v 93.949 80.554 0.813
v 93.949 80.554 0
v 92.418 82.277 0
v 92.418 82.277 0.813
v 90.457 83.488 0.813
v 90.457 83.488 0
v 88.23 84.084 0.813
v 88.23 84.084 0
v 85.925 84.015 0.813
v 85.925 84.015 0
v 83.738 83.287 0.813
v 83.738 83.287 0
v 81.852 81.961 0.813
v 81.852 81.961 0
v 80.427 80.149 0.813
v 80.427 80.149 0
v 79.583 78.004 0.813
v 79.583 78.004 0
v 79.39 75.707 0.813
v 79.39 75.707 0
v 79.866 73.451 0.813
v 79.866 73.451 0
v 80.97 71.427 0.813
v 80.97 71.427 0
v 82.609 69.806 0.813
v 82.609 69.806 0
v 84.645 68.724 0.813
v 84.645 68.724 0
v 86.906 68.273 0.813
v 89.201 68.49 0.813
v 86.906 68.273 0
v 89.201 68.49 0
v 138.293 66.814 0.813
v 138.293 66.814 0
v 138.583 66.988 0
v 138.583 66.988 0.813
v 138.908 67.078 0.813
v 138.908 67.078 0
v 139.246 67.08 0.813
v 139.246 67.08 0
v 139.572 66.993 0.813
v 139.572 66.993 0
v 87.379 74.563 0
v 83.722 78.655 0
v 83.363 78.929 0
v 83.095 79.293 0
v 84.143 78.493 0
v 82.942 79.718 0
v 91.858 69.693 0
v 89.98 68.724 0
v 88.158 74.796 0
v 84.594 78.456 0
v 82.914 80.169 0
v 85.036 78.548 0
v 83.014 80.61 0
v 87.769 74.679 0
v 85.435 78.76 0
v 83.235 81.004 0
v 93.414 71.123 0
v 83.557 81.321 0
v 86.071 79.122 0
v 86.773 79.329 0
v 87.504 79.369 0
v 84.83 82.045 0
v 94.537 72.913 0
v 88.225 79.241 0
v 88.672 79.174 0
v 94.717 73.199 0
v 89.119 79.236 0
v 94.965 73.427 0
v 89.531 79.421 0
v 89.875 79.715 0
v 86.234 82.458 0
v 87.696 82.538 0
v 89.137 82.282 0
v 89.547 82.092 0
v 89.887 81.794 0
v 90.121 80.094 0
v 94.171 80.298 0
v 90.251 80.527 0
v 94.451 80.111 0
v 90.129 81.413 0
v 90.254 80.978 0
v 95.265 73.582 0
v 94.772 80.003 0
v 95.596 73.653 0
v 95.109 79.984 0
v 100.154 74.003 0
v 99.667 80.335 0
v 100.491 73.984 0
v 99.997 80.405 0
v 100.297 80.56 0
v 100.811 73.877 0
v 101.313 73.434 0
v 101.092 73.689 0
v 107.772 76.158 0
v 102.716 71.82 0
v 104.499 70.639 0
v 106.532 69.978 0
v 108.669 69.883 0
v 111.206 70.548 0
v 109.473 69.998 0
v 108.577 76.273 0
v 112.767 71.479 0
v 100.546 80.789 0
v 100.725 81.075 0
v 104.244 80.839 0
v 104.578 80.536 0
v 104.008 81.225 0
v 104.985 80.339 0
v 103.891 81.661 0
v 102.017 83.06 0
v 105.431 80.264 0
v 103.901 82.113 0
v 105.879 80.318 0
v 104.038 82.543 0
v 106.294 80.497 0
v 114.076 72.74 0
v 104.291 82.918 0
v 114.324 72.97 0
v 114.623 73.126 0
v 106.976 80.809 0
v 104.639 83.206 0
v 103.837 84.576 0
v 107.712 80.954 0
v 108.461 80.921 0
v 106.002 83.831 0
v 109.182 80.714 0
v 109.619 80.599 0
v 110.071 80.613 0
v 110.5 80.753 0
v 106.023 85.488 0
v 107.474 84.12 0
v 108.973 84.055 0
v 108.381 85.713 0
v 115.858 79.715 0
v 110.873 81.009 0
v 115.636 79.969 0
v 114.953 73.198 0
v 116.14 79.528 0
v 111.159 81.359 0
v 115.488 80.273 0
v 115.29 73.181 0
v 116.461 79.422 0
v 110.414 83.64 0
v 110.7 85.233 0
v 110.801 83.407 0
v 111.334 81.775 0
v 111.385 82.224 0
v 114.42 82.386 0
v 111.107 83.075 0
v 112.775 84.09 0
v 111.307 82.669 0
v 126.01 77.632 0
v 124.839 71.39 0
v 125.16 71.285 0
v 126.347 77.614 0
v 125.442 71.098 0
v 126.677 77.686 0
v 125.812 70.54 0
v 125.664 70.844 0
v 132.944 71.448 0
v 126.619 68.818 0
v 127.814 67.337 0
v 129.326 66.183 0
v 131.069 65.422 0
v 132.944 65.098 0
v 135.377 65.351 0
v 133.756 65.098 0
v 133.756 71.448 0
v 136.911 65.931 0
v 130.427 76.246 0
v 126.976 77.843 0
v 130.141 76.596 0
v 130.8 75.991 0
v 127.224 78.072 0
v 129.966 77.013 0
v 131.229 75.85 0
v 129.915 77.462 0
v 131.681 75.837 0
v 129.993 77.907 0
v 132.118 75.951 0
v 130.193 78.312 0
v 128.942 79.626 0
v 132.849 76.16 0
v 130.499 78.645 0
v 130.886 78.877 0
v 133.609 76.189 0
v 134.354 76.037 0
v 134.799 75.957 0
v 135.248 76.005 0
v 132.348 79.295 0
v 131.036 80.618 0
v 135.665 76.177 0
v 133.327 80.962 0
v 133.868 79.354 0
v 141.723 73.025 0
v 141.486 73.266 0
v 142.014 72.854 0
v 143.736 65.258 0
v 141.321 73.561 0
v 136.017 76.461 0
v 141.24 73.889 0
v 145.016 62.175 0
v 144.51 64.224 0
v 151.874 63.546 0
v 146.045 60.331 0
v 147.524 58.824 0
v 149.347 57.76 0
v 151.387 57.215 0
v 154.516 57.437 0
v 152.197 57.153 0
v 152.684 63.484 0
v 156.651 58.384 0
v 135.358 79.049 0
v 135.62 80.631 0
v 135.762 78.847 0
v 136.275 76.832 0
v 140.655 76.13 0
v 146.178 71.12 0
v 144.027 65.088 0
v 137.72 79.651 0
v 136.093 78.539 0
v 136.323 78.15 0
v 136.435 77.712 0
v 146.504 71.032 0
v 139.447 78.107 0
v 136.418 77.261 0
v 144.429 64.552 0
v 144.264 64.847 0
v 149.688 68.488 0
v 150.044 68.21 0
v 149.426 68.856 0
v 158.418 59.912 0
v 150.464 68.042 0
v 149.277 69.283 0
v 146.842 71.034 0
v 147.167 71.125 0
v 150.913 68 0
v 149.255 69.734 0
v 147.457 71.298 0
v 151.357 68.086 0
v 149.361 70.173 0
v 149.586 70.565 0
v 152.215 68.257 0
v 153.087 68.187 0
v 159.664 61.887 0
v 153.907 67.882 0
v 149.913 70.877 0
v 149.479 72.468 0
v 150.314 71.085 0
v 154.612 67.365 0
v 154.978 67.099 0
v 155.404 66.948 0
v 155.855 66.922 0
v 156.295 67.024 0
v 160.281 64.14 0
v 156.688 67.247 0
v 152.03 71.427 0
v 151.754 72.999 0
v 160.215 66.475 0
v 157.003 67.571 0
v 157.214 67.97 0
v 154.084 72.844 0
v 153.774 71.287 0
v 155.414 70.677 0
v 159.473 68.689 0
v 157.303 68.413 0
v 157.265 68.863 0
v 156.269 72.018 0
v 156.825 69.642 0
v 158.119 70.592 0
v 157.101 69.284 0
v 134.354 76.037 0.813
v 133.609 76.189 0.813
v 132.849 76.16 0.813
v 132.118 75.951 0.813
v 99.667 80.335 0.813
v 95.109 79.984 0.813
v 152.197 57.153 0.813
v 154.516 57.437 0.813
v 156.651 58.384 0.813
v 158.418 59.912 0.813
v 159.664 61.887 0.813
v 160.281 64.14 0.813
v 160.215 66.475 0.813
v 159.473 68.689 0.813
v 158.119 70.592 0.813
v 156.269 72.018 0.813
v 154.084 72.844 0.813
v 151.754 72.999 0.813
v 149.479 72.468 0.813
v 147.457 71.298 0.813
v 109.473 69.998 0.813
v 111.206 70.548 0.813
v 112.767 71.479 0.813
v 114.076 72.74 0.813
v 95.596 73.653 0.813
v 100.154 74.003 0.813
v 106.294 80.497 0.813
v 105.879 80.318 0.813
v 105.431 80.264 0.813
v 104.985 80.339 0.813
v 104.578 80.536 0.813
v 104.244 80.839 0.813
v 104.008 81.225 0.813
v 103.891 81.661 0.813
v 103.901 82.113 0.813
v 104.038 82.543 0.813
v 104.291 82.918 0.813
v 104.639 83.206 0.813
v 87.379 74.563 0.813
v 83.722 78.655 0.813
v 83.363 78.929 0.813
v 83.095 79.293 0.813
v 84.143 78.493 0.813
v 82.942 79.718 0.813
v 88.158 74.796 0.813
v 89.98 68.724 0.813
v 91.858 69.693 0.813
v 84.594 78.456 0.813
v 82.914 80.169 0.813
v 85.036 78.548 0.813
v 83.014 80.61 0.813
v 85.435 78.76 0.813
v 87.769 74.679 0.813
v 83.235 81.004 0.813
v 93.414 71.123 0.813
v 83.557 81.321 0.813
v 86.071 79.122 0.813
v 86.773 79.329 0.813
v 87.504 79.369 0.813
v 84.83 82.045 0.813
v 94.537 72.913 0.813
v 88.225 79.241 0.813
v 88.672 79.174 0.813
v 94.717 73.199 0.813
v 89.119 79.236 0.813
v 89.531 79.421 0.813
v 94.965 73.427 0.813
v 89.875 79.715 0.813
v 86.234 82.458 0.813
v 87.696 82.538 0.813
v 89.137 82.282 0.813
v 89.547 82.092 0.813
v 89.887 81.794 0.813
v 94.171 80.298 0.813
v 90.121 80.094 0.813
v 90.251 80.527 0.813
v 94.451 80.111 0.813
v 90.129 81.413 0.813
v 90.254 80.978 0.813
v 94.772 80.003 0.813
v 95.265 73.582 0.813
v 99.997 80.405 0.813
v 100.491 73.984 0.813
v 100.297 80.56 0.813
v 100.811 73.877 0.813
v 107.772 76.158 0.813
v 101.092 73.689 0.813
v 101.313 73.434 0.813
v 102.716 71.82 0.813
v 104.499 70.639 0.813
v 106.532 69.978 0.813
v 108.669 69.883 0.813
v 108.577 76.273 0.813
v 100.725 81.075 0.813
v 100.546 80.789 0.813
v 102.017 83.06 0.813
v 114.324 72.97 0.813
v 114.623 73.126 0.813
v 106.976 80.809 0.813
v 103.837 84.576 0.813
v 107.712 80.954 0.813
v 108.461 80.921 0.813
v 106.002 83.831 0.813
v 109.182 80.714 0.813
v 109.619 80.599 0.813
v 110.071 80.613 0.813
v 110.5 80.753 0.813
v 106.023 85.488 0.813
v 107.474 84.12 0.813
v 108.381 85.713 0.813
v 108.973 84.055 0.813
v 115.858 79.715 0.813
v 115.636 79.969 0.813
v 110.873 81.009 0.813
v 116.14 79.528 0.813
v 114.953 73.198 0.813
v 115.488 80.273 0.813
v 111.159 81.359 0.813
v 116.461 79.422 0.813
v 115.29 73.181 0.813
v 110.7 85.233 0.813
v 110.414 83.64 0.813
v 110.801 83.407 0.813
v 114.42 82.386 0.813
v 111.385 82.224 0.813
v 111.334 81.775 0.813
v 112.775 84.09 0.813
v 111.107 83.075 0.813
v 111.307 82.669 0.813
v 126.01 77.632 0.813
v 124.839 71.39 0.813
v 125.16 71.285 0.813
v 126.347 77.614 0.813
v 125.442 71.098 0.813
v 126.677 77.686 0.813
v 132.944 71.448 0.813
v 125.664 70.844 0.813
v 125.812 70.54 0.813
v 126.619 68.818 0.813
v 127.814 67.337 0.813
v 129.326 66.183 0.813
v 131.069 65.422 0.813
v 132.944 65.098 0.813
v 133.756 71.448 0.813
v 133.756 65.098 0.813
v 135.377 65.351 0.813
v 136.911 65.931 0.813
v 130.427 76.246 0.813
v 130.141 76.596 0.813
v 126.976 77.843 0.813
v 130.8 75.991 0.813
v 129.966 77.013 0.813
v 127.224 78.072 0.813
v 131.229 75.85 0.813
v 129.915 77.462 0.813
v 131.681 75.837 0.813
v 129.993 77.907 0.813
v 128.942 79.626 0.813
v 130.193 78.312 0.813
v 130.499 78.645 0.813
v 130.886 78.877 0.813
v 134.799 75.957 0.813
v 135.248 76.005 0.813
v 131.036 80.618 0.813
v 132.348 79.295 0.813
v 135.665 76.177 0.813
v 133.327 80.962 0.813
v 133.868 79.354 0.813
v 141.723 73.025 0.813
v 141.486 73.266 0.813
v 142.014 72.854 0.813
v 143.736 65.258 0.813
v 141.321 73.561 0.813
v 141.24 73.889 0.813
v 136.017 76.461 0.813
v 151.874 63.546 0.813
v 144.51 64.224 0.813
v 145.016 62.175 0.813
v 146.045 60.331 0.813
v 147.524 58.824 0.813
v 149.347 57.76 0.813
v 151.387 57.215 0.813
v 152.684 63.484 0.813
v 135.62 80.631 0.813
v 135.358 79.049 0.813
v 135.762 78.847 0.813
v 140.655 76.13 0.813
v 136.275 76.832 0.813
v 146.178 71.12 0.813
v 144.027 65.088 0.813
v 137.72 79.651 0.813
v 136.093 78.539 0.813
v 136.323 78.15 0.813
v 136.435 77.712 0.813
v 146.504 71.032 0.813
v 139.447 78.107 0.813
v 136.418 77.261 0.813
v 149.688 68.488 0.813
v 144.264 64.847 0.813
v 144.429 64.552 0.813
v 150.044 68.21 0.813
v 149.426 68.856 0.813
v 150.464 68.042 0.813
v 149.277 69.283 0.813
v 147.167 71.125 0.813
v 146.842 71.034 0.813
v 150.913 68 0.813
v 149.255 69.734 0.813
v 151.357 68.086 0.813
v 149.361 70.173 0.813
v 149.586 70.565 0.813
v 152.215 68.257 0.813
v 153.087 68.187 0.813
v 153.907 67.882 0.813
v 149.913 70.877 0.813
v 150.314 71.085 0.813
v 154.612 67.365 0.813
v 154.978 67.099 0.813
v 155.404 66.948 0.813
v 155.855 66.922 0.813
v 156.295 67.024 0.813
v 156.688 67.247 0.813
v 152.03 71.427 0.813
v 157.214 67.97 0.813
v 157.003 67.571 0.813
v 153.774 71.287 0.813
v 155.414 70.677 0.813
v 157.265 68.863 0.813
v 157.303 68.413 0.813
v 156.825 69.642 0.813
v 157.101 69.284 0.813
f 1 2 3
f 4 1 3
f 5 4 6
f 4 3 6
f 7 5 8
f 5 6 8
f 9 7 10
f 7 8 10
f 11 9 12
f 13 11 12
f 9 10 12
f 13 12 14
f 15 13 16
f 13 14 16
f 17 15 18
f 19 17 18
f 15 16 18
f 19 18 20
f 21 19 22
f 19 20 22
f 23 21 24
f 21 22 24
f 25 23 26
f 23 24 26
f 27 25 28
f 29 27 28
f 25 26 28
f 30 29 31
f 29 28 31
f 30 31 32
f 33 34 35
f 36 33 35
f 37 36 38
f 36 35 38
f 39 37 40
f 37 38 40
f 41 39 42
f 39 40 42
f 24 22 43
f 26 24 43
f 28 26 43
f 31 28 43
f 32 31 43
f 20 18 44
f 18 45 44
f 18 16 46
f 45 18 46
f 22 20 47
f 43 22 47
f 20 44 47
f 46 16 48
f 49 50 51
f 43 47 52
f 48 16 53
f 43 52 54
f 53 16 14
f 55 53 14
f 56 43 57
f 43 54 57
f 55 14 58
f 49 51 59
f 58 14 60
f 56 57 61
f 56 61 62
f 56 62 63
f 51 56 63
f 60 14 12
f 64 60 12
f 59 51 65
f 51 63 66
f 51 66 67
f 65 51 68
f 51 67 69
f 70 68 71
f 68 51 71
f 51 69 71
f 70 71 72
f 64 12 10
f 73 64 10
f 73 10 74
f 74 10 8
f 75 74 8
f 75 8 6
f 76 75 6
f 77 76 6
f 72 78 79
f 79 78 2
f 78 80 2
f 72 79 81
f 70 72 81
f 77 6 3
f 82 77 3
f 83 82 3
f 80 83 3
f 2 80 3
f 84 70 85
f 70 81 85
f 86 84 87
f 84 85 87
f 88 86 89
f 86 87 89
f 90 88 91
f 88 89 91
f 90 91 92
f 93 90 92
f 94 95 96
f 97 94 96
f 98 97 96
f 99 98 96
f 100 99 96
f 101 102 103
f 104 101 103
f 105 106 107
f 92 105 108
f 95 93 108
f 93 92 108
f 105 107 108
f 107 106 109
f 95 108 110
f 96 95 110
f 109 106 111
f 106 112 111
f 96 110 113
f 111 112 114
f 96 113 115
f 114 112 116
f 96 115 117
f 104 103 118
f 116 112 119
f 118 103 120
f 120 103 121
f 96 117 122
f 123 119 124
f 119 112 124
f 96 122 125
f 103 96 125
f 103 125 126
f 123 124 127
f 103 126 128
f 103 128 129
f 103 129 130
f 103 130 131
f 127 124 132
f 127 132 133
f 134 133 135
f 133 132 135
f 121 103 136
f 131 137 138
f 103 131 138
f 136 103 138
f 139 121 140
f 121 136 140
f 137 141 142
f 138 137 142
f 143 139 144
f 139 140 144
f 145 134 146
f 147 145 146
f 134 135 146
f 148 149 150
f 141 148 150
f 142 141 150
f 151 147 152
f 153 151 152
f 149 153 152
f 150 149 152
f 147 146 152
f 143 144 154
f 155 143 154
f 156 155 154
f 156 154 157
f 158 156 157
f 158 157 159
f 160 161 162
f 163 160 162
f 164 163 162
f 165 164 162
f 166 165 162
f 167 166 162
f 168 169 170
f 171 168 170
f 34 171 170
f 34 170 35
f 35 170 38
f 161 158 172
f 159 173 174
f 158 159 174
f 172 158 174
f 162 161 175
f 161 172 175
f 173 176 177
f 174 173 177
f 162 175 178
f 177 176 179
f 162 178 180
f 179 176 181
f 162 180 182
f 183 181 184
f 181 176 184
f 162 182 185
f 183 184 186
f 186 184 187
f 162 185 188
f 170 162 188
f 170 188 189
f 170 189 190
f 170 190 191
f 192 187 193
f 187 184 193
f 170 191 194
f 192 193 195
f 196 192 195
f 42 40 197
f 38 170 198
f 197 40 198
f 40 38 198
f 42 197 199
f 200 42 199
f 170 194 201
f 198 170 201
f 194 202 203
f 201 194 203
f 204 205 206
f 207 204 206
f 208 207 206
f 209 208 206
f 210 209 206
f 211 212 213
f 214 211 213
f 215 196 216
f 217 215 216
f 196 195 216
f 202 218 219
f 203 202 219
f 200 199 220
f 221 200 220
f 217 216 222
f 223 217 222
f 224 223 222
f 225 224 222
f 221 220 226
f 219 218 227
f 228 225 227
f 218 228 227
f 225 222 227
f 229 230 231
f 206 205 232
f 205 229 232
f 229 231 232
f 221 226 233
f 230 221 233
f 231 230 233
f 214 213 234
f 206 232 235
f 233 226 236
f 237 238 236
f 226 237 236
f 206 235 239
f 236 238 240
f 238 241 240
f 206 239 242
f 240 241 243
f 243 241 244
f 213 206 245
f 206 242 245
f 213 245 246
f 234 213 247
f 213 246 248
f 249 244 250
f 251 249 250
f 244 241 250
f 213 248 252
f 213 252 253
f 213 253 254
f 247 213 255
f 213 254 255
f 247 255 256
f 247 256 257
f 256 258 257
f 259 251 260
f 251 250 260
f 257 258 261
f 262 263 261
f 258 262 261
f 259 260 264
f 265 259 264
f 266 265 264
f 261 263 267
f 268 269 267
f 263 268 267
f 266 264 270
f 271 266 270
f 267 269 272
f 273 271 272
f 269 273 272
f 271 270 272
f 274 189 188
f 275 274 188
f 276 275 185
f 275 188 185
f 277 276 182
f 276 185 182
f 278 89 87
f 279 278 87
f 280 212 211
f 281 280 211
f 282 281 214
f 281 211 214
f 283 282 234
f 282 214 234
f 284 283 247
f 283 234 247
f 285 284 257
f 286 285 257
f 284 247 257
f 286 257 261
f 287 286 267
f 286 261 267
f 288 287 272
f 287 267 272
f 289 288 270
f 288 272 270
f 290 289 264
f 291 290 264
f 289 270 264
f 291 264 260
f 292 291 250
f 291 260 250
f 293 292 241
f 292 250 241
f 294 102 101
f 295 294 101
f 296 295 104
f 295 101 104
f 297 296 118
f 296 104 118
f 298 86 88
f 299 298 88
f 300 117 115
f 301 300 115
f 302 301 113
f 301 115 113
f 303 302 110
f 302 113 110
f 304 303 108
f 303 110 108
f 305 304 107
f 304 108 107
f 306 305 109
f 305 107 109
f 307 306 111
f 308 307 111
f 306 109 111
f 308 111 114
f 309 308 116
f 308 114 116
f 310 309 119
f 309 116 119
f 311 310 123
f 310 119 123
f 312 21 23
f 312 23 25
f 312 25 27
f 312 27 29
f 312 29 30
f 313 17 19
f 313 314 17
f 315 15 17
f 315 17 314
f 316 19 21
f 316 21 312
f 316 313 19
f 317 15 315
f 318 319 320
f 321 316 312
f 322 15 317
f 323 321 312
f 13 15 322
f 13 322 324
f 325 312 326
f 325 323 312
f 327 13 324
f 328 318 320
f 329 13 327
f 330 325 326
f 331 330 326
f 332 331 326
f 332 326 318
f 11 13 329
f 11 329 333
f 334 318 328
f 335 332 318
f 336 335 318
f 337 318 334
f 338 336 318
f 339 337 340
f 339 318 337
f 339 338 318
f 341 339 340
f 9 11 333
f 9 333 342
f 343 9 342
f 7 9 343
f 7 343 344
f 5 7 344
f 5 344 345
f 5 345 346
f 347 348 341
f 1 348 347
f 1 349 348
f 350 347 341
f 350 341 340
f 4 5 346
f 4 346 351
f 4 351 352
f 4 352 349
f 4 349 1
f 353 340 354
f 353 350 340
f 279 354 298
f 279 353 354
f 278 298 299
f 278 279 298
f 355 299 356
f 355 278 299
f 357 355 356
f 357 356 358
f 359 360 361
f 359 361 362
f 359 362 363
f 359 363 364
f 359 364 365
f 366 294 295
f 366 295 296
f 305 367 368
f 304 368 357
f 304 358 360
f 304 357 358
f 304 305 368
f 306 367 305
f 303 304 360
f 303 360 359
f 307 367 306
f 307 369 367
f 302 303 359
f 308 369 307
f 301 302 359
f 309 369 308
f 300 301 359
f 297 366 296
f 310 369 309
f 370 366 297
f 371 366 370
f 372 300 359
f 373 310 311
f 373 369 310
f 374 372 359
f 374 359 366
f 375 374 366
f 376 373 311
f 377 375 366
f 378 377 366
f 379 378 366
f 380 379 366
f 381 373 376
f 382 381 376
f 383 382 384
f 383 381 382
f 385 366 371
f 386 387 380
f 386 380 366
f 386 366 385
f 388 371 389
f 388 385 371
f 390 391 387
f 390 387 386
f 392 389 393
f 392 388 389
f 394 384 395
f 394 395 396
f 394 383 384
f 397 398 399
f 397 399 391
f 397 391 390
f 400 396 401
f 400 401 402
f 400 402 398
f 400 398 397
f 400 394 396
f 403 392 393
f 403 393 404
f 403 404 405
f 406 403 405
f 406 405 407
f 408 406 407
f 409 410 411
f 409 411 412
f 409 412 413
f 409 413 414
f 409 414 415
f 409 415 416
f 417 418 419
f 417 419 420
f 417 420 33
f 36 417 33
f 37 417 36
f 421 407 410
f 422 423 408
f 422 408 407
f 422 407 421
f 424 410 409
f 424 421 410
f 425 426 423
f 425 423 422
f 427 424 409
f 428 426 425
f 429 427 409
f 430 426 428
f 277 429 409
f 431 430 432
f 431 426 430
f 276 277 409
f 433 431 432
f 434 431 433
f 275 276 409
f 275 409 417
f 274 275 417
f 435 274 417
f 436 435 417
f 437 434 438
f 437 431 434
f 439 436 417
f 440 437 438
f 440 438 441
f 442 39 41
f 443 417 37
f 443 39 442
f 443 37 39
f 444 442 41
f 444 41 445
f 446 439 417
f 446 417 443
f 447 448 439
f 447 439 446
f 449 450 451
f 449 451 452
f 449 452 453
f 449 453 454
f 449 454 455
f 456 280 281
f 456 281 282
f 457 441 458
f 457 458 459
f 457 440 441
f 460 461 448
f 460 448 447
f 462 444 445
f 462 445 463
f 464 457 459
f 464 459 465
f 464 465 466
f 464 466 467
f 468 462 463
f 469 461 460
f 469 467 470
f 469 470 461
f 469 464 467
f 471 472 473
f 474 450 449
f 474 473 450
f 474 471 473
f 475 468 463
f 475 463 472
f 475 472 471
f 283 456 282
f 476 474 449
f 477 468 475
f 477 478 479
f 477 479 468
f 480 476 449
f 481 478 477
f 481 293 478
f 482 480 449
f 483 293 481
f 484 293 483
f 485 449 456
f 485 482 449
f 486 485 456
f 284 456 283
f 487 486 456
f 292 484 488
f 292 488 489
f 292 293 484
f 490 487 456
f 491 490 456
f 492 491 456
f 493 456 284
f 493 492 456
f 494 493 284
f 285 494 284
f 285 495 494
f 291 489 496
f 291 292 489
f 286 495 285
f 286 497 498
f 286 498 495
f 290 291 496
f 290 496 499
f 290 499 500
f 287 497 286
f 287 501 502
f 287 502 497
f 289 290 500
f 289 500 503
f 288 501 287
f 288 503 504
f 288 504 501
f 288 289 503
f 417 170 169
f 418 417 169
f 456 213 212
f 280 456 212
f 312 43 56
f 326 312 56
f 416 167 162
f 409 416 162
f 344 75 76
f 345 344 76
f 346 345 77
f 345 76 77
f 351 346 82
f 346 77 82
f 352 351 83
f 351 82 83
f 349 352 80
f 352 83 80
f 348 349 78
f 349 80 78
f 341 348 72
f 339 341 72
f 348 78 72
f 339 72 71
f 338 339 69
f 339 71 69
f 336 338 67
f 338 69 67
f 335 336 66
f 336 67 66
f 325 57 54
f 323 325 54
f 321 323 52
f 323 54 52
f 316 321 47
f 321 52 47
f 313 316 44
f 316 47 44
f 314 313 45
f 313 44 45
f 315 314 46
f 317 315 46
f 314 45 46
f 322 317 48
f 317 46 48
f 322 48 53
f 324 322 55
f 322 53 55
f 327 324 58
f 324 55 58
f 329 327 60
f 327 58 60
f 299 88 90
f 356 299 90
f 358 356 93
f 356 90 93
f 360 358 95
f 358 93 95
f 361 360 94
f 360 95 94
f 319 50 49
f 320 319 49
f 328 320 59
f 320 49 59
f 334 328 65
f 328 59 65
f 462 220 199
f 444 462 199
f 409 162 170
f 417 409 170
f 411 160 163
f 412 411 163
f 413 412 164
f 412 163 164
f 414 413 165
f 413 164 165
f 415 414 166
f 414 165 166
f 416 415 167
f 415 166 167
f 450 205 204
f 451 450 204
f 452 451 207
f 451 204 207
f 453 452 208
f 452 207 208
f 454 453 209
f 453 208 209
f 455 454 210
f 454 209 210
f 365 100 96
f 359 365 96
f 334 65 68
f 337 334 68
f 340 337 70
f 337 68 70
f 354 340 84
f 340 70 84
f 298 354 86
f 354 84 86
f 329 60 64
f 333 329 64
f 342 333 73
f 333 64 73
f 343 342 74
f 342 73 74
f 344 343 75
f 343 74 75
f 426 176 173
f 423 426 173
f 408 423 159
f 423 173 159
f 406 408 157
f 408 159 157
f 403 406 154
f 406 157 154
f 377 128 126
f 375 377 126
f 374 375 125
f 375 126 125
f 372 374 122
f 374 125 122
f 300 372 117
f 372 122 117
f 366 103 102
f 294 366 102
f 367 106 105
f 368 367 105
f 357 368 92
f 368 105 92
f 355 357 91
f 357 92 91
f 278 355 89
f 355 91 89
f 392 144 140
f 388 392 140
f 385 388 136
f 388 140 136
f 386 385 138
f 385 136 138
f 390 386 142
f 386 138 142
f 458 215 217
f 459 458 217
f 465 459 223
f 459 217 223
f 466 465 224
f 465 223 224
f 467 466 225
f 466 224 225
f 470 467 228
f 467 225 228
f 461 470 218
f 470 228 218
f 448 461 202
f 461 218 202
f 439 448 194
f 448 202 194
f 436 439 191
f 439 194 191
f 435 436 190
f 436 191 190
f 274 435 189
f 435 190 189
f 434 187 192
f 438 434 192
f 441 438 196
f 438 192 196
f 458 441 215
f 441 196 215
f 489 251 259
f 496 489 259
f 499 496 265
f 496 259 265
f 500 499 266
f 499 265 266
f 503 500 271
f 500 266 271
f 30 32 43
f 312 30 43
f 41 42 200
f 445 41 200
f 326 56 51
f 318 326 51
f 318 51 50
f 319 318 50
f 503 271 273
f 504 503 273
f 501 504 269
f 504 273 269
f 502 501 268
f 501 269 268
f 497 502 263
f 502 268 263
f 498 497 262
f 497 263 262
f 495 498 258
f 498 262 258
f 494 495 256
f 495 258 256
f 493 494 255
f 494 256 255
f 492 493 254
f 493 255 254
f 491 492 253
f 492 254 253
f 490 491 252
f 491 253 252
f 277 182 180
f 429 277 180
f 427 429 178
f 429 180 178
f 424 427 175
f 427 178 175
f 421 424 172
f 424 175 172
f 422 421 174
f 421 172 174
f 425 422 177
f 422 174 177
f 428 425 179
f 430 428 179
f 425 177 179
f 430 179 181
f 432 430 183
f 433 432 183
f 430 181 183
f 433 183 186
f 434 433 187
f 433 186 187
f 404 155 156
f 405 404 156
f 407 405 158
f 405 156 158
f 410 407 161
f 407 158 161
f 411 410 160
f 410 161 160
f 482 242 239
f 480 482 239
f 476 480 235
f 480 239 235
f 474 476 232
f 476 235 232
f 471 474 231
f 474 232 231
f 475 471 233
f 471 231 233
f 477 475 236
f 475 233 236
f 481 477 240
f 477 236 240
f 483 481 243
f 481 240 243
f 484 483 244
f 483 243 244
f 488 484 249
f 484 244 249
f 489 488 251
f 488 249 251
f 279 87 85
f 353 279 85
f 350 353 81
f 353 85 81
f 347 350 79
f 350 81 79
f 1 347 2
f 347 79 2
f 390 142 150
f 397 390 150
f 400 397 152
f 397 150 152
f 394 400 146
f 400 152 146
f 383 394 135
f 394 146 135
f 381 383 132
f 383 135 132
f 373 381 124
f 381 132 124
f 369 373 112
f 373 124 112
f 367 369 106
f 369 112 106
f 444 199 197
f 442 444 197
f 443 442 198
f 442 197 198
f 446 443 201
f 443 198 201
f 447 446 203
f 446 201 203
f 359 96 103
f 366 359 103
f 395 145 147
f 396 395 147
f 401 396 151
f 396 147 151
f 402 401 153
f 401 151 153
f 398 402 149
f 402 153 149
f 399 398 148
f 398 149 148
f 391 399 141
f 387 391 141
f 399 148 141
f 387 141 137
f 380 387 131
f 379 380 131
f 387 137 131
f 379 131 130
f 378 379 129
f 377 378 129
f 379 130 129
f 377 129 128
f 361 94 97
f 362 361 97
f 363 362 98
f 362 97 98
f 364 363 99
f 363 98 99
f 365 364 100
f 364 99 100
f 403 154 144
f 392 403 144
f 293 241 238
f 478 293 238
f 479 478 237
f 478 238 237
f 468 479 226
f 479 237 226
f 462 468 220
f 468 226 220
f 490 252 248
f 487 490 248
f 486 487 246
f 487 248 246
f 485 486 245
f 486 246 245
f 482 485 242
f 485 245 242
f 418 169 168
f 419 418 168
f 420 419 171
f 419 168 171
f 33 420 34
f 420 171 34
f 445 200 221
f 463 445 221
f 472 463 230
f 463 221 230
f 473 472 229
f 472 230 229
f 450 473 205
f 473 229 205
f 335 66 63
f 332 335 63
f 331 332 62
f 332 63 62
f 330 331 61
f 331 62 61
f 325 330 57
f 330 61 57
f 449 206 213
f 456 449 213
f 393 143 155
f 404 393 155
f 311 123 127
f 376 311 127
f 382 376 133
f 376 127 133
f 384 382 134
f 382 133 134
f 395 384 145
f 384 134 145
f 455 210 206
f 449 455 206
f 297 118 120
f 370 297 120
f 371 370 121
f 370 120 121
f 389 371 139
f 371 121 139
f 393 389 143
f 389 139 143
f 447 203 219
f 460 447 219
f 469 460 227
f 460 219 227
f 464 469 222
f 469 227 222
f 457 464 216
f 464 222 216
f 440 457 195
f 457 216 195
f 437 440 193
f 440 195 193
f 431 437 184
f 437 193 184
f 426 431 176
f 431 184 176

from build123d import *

# Parameters (mm, degrees)
BOSS_EXTRUDE1_DEPTH = 0.8128


with BuildPart() as part:
    # Sketch4 → Boss-Extrude1 (new body)
    with BuildSketch(Plane.XY):
        with BuildLine():
            ThreePointArc((93.949424924, 80.553749396), (79.926578404, 79.107244128), (89.201071756, 68.490447291))
            Line((89.201071756, 68.490447291), (87.379404166, 74.562672592))
            Line((87.379404166, 74.562672592), (87.768664768, 74.679450772))
            Line((87.768664768, 74.679450772), (88.157925371, 74.796228953))
            Line((88.157925371, 74.796228953), (89.979592961, 68.724003652))
            ThreePointArc((89.979592961, 68.724003652), (92.683522719, 70.35568471), (94.537210983, 72.912530234))
            ThreePointArc((94.537210983, 72.912530234), (94.965343033, 73.427292247), (95.595760228, 73.652794227))
            Line((95.595760228, 73.652794227), (100.153762821, 74.003409811))
            ThreePointArc((100.153762821, 74.003409811), (100.811251698, 73.876977473), (101.313075076, 73.433750604))
            ThreePointArc((101.313075076, 73.433750604), (104.499077144, 70.639420699), (108.66874425, 69.88260829))
            Line((108.66874425, 69.88260829), (107.772190929, 76.15848154))
            Line((107.772190929, 76.15848154), (108.174506403, 76.215955179))
            Line((108.174506403, 76.215955179), (108.576821877, 76.273428818))
            Line((108.576821877, 76.273428818), (109.473375199, 69.997555568))
            ThreePointArc((109.473375199, 69.997555568), (112.013123253, 70.968780496), (114.076058013, 72.740191859))
            ThreePointArc((114.076058013, 72.740191859), (114.622955908, 73.126429859), (115.290273938, 73.180870175))
            Line((115.290273938, 73.180870175), (124.839494012, 71.390391411))
            ThreePointArc((124.839494012, 71.390391411), (125.441762928, 71.097903494), (125.811592802, 70.539779051))
            ThreePointArc((125.811592802, 70.539779051), (128.535078066, 66.714656664), (132.9436, 65.097910667))
            Line((132.9436, 65.097910667), (132.9436, 71.447910667))
            Line((132.9436, 71.447910667), (133.35, 71.447910667))
            Line((133.35, 71.447910667), (133.7564, 71.447910667))
            Line((133.7564, 71.447910667), (133.7564, 65.097910667))
            ThreePointArc((133.7564, 65.097910667), (136.15889652, 65.601119169), (138.292771811, 66.814290453))
            ThreePointArc((138.292771811, 66.814290453), (138.908022168, 67.078379412), (139.572075423, 66.99288524))
            Line((139.572075423, 66.99288524), (143.735615445, 65.258076898))
            ThreePointArc((143.735615445, 65.258076898), (144.263910207, 64.846759758), (144.509615464, 64.223938699))
            ThreePointArc((144.509615464, 64.223938699), (146.734319899, 59.528365603), (151.386817059, 57.214929481))
            Line((151.386817059, 57.214929481), (151.873839827, 63.546225464))
            Line((151.873839827, 63.546225464), (152.27904277, 63.515056007))
            Line((152.27904277, 63.515056007), (152.684245713, 63.48388655))
            Line((152.684245713, 63.48388655), (152.197222945, 57.152590567))
            ThreePointArc((152.197222945, 57.152590567), (159.92620767, 67.609424733), (147.457228033, 71.298209423))
            ThreePointArc((147.457228033, 71.298209423), (146.84197711, 71.034120487), (146.177923414, 71.119615244))
            Line((146.177923414, 71.119615244), (142.014384371, 72.854423179))
            ThreePointArc((142.014384371, 72.854423179), (141.486089803, 73.265740229), (141.240384561, 73.888561071))
            ThreePointArc((141.240384561, 73.888561071), (135.620274674, 80.630902915), (127.223942036, 78.0723082))
            ThreePointArc((127.223942036, 78.0723082), (126.677044199, 77.68607018), (126.009726211, 77.631629797))
            Line((126.009726211, 77.631629797), (116.460505988, 79.422108589))
            ThreePointArc((116.460505988, 79.422108589), (115.858237072, 79.714596506), (115.488407198, 80.272720949))
            ThreePointArc((115.488407198, 80.272720949), (108.380699585, 85.713306212), (100.725289029, 81.074969792))
            ThreePointArc((100.725289029, 81.074969792), (100.297156978, 80.560207761), (99.666739772, 80.334705773))
            Line((99.666739772, 80.334705773), (95.108737382, 79.984090204))
            ThreePointArc((95.108737382, 79.984090204), (94.451248393, 80.110522482), (93.949424924, 80.553749396))
        make_face()
        with BuildLine():
            ThreePointArc((156.824589095, 69.642224068), (156.857122838, 67.397395778), (154.612294548, 67.364862034))
            ThreePointArc((154.612294548, 67.364862034), (153.086943568, 68.187295725), (151.356947016, 68.08627733))
            ThreePointArc((151.356947016, 68.08627733), (149.336031859, 69.064139502), (150.313894032, 71.085054659))
            ThreePointArc((150.313894032, 71.085054659), (153.773887136, 71.287091449), (156.824589095, 69.642224068))
        make_face(mode=Mode.SUBTRACT)
        with BuildLine():
            ThreePointArc((88.224829537, 79.241098456), (86.773324607, 79.32888397), (85.434920368, 78.760335862))
            ThreePointArc((85.434920368, 78.760335862), (83.215962621, 79.101713977), (83.557340736, 81.320671724))
            ThreePointArc((83.557340736, 81.320671724), (86.234149214, 82.457767939), (89.137159073, 82.282196911))
            ThreePointArc((89.137159073, 82.282196911), (90.201543533, 80.305482915), (88.224829537, 79.241098456))
        make_face(mode=Mode.SUBTRACT)
        with BuildLine():
            ThreePointArc((106.29439622, 80.496669822), (104.112009419, 81.023452843), (104.63879244, 83.205839644))
            ThreePointArc((104.63879244, 83.205839644), (107.474111012, 84.119642581), (110.41416195, 83.639884632))
            ThreePointArc((110.41416195, 83.639884632), (111.261217621, 81.560747987), (109.182080975, 80.713692316))
            ThreePointArc((109.182080975, 80.713692316), (107.712055506, 80.953571291), (106.29439622, 80.496669822))
        make_face(mode=Mode.SUBTRACT)
        with BuildLine():
            ThreePointArc((132.117919025, 75.951192316), (130.038782379, 76.798247987), (130.88583805, 78.877384632))
            ThreePointArc((130.88583805, 78.877384632), (133.106309101, 79.370322273), (135.358046314, 79.049138943))
            ThreePointArc((135.358046314, 79.049138943), (136.362069471, 77.041092628), (134.354023157, 76.037069471))
            ThreePointArc((134.354023157, 76.037069471), (133.228154551, 76.197661136), (132.117919025, 75.951192316))
        make_face(mode=Mode.SUBTRACT)
    extrude(amount=BOSS_EXTRUDE1_DEPTH)


solid = part.part
